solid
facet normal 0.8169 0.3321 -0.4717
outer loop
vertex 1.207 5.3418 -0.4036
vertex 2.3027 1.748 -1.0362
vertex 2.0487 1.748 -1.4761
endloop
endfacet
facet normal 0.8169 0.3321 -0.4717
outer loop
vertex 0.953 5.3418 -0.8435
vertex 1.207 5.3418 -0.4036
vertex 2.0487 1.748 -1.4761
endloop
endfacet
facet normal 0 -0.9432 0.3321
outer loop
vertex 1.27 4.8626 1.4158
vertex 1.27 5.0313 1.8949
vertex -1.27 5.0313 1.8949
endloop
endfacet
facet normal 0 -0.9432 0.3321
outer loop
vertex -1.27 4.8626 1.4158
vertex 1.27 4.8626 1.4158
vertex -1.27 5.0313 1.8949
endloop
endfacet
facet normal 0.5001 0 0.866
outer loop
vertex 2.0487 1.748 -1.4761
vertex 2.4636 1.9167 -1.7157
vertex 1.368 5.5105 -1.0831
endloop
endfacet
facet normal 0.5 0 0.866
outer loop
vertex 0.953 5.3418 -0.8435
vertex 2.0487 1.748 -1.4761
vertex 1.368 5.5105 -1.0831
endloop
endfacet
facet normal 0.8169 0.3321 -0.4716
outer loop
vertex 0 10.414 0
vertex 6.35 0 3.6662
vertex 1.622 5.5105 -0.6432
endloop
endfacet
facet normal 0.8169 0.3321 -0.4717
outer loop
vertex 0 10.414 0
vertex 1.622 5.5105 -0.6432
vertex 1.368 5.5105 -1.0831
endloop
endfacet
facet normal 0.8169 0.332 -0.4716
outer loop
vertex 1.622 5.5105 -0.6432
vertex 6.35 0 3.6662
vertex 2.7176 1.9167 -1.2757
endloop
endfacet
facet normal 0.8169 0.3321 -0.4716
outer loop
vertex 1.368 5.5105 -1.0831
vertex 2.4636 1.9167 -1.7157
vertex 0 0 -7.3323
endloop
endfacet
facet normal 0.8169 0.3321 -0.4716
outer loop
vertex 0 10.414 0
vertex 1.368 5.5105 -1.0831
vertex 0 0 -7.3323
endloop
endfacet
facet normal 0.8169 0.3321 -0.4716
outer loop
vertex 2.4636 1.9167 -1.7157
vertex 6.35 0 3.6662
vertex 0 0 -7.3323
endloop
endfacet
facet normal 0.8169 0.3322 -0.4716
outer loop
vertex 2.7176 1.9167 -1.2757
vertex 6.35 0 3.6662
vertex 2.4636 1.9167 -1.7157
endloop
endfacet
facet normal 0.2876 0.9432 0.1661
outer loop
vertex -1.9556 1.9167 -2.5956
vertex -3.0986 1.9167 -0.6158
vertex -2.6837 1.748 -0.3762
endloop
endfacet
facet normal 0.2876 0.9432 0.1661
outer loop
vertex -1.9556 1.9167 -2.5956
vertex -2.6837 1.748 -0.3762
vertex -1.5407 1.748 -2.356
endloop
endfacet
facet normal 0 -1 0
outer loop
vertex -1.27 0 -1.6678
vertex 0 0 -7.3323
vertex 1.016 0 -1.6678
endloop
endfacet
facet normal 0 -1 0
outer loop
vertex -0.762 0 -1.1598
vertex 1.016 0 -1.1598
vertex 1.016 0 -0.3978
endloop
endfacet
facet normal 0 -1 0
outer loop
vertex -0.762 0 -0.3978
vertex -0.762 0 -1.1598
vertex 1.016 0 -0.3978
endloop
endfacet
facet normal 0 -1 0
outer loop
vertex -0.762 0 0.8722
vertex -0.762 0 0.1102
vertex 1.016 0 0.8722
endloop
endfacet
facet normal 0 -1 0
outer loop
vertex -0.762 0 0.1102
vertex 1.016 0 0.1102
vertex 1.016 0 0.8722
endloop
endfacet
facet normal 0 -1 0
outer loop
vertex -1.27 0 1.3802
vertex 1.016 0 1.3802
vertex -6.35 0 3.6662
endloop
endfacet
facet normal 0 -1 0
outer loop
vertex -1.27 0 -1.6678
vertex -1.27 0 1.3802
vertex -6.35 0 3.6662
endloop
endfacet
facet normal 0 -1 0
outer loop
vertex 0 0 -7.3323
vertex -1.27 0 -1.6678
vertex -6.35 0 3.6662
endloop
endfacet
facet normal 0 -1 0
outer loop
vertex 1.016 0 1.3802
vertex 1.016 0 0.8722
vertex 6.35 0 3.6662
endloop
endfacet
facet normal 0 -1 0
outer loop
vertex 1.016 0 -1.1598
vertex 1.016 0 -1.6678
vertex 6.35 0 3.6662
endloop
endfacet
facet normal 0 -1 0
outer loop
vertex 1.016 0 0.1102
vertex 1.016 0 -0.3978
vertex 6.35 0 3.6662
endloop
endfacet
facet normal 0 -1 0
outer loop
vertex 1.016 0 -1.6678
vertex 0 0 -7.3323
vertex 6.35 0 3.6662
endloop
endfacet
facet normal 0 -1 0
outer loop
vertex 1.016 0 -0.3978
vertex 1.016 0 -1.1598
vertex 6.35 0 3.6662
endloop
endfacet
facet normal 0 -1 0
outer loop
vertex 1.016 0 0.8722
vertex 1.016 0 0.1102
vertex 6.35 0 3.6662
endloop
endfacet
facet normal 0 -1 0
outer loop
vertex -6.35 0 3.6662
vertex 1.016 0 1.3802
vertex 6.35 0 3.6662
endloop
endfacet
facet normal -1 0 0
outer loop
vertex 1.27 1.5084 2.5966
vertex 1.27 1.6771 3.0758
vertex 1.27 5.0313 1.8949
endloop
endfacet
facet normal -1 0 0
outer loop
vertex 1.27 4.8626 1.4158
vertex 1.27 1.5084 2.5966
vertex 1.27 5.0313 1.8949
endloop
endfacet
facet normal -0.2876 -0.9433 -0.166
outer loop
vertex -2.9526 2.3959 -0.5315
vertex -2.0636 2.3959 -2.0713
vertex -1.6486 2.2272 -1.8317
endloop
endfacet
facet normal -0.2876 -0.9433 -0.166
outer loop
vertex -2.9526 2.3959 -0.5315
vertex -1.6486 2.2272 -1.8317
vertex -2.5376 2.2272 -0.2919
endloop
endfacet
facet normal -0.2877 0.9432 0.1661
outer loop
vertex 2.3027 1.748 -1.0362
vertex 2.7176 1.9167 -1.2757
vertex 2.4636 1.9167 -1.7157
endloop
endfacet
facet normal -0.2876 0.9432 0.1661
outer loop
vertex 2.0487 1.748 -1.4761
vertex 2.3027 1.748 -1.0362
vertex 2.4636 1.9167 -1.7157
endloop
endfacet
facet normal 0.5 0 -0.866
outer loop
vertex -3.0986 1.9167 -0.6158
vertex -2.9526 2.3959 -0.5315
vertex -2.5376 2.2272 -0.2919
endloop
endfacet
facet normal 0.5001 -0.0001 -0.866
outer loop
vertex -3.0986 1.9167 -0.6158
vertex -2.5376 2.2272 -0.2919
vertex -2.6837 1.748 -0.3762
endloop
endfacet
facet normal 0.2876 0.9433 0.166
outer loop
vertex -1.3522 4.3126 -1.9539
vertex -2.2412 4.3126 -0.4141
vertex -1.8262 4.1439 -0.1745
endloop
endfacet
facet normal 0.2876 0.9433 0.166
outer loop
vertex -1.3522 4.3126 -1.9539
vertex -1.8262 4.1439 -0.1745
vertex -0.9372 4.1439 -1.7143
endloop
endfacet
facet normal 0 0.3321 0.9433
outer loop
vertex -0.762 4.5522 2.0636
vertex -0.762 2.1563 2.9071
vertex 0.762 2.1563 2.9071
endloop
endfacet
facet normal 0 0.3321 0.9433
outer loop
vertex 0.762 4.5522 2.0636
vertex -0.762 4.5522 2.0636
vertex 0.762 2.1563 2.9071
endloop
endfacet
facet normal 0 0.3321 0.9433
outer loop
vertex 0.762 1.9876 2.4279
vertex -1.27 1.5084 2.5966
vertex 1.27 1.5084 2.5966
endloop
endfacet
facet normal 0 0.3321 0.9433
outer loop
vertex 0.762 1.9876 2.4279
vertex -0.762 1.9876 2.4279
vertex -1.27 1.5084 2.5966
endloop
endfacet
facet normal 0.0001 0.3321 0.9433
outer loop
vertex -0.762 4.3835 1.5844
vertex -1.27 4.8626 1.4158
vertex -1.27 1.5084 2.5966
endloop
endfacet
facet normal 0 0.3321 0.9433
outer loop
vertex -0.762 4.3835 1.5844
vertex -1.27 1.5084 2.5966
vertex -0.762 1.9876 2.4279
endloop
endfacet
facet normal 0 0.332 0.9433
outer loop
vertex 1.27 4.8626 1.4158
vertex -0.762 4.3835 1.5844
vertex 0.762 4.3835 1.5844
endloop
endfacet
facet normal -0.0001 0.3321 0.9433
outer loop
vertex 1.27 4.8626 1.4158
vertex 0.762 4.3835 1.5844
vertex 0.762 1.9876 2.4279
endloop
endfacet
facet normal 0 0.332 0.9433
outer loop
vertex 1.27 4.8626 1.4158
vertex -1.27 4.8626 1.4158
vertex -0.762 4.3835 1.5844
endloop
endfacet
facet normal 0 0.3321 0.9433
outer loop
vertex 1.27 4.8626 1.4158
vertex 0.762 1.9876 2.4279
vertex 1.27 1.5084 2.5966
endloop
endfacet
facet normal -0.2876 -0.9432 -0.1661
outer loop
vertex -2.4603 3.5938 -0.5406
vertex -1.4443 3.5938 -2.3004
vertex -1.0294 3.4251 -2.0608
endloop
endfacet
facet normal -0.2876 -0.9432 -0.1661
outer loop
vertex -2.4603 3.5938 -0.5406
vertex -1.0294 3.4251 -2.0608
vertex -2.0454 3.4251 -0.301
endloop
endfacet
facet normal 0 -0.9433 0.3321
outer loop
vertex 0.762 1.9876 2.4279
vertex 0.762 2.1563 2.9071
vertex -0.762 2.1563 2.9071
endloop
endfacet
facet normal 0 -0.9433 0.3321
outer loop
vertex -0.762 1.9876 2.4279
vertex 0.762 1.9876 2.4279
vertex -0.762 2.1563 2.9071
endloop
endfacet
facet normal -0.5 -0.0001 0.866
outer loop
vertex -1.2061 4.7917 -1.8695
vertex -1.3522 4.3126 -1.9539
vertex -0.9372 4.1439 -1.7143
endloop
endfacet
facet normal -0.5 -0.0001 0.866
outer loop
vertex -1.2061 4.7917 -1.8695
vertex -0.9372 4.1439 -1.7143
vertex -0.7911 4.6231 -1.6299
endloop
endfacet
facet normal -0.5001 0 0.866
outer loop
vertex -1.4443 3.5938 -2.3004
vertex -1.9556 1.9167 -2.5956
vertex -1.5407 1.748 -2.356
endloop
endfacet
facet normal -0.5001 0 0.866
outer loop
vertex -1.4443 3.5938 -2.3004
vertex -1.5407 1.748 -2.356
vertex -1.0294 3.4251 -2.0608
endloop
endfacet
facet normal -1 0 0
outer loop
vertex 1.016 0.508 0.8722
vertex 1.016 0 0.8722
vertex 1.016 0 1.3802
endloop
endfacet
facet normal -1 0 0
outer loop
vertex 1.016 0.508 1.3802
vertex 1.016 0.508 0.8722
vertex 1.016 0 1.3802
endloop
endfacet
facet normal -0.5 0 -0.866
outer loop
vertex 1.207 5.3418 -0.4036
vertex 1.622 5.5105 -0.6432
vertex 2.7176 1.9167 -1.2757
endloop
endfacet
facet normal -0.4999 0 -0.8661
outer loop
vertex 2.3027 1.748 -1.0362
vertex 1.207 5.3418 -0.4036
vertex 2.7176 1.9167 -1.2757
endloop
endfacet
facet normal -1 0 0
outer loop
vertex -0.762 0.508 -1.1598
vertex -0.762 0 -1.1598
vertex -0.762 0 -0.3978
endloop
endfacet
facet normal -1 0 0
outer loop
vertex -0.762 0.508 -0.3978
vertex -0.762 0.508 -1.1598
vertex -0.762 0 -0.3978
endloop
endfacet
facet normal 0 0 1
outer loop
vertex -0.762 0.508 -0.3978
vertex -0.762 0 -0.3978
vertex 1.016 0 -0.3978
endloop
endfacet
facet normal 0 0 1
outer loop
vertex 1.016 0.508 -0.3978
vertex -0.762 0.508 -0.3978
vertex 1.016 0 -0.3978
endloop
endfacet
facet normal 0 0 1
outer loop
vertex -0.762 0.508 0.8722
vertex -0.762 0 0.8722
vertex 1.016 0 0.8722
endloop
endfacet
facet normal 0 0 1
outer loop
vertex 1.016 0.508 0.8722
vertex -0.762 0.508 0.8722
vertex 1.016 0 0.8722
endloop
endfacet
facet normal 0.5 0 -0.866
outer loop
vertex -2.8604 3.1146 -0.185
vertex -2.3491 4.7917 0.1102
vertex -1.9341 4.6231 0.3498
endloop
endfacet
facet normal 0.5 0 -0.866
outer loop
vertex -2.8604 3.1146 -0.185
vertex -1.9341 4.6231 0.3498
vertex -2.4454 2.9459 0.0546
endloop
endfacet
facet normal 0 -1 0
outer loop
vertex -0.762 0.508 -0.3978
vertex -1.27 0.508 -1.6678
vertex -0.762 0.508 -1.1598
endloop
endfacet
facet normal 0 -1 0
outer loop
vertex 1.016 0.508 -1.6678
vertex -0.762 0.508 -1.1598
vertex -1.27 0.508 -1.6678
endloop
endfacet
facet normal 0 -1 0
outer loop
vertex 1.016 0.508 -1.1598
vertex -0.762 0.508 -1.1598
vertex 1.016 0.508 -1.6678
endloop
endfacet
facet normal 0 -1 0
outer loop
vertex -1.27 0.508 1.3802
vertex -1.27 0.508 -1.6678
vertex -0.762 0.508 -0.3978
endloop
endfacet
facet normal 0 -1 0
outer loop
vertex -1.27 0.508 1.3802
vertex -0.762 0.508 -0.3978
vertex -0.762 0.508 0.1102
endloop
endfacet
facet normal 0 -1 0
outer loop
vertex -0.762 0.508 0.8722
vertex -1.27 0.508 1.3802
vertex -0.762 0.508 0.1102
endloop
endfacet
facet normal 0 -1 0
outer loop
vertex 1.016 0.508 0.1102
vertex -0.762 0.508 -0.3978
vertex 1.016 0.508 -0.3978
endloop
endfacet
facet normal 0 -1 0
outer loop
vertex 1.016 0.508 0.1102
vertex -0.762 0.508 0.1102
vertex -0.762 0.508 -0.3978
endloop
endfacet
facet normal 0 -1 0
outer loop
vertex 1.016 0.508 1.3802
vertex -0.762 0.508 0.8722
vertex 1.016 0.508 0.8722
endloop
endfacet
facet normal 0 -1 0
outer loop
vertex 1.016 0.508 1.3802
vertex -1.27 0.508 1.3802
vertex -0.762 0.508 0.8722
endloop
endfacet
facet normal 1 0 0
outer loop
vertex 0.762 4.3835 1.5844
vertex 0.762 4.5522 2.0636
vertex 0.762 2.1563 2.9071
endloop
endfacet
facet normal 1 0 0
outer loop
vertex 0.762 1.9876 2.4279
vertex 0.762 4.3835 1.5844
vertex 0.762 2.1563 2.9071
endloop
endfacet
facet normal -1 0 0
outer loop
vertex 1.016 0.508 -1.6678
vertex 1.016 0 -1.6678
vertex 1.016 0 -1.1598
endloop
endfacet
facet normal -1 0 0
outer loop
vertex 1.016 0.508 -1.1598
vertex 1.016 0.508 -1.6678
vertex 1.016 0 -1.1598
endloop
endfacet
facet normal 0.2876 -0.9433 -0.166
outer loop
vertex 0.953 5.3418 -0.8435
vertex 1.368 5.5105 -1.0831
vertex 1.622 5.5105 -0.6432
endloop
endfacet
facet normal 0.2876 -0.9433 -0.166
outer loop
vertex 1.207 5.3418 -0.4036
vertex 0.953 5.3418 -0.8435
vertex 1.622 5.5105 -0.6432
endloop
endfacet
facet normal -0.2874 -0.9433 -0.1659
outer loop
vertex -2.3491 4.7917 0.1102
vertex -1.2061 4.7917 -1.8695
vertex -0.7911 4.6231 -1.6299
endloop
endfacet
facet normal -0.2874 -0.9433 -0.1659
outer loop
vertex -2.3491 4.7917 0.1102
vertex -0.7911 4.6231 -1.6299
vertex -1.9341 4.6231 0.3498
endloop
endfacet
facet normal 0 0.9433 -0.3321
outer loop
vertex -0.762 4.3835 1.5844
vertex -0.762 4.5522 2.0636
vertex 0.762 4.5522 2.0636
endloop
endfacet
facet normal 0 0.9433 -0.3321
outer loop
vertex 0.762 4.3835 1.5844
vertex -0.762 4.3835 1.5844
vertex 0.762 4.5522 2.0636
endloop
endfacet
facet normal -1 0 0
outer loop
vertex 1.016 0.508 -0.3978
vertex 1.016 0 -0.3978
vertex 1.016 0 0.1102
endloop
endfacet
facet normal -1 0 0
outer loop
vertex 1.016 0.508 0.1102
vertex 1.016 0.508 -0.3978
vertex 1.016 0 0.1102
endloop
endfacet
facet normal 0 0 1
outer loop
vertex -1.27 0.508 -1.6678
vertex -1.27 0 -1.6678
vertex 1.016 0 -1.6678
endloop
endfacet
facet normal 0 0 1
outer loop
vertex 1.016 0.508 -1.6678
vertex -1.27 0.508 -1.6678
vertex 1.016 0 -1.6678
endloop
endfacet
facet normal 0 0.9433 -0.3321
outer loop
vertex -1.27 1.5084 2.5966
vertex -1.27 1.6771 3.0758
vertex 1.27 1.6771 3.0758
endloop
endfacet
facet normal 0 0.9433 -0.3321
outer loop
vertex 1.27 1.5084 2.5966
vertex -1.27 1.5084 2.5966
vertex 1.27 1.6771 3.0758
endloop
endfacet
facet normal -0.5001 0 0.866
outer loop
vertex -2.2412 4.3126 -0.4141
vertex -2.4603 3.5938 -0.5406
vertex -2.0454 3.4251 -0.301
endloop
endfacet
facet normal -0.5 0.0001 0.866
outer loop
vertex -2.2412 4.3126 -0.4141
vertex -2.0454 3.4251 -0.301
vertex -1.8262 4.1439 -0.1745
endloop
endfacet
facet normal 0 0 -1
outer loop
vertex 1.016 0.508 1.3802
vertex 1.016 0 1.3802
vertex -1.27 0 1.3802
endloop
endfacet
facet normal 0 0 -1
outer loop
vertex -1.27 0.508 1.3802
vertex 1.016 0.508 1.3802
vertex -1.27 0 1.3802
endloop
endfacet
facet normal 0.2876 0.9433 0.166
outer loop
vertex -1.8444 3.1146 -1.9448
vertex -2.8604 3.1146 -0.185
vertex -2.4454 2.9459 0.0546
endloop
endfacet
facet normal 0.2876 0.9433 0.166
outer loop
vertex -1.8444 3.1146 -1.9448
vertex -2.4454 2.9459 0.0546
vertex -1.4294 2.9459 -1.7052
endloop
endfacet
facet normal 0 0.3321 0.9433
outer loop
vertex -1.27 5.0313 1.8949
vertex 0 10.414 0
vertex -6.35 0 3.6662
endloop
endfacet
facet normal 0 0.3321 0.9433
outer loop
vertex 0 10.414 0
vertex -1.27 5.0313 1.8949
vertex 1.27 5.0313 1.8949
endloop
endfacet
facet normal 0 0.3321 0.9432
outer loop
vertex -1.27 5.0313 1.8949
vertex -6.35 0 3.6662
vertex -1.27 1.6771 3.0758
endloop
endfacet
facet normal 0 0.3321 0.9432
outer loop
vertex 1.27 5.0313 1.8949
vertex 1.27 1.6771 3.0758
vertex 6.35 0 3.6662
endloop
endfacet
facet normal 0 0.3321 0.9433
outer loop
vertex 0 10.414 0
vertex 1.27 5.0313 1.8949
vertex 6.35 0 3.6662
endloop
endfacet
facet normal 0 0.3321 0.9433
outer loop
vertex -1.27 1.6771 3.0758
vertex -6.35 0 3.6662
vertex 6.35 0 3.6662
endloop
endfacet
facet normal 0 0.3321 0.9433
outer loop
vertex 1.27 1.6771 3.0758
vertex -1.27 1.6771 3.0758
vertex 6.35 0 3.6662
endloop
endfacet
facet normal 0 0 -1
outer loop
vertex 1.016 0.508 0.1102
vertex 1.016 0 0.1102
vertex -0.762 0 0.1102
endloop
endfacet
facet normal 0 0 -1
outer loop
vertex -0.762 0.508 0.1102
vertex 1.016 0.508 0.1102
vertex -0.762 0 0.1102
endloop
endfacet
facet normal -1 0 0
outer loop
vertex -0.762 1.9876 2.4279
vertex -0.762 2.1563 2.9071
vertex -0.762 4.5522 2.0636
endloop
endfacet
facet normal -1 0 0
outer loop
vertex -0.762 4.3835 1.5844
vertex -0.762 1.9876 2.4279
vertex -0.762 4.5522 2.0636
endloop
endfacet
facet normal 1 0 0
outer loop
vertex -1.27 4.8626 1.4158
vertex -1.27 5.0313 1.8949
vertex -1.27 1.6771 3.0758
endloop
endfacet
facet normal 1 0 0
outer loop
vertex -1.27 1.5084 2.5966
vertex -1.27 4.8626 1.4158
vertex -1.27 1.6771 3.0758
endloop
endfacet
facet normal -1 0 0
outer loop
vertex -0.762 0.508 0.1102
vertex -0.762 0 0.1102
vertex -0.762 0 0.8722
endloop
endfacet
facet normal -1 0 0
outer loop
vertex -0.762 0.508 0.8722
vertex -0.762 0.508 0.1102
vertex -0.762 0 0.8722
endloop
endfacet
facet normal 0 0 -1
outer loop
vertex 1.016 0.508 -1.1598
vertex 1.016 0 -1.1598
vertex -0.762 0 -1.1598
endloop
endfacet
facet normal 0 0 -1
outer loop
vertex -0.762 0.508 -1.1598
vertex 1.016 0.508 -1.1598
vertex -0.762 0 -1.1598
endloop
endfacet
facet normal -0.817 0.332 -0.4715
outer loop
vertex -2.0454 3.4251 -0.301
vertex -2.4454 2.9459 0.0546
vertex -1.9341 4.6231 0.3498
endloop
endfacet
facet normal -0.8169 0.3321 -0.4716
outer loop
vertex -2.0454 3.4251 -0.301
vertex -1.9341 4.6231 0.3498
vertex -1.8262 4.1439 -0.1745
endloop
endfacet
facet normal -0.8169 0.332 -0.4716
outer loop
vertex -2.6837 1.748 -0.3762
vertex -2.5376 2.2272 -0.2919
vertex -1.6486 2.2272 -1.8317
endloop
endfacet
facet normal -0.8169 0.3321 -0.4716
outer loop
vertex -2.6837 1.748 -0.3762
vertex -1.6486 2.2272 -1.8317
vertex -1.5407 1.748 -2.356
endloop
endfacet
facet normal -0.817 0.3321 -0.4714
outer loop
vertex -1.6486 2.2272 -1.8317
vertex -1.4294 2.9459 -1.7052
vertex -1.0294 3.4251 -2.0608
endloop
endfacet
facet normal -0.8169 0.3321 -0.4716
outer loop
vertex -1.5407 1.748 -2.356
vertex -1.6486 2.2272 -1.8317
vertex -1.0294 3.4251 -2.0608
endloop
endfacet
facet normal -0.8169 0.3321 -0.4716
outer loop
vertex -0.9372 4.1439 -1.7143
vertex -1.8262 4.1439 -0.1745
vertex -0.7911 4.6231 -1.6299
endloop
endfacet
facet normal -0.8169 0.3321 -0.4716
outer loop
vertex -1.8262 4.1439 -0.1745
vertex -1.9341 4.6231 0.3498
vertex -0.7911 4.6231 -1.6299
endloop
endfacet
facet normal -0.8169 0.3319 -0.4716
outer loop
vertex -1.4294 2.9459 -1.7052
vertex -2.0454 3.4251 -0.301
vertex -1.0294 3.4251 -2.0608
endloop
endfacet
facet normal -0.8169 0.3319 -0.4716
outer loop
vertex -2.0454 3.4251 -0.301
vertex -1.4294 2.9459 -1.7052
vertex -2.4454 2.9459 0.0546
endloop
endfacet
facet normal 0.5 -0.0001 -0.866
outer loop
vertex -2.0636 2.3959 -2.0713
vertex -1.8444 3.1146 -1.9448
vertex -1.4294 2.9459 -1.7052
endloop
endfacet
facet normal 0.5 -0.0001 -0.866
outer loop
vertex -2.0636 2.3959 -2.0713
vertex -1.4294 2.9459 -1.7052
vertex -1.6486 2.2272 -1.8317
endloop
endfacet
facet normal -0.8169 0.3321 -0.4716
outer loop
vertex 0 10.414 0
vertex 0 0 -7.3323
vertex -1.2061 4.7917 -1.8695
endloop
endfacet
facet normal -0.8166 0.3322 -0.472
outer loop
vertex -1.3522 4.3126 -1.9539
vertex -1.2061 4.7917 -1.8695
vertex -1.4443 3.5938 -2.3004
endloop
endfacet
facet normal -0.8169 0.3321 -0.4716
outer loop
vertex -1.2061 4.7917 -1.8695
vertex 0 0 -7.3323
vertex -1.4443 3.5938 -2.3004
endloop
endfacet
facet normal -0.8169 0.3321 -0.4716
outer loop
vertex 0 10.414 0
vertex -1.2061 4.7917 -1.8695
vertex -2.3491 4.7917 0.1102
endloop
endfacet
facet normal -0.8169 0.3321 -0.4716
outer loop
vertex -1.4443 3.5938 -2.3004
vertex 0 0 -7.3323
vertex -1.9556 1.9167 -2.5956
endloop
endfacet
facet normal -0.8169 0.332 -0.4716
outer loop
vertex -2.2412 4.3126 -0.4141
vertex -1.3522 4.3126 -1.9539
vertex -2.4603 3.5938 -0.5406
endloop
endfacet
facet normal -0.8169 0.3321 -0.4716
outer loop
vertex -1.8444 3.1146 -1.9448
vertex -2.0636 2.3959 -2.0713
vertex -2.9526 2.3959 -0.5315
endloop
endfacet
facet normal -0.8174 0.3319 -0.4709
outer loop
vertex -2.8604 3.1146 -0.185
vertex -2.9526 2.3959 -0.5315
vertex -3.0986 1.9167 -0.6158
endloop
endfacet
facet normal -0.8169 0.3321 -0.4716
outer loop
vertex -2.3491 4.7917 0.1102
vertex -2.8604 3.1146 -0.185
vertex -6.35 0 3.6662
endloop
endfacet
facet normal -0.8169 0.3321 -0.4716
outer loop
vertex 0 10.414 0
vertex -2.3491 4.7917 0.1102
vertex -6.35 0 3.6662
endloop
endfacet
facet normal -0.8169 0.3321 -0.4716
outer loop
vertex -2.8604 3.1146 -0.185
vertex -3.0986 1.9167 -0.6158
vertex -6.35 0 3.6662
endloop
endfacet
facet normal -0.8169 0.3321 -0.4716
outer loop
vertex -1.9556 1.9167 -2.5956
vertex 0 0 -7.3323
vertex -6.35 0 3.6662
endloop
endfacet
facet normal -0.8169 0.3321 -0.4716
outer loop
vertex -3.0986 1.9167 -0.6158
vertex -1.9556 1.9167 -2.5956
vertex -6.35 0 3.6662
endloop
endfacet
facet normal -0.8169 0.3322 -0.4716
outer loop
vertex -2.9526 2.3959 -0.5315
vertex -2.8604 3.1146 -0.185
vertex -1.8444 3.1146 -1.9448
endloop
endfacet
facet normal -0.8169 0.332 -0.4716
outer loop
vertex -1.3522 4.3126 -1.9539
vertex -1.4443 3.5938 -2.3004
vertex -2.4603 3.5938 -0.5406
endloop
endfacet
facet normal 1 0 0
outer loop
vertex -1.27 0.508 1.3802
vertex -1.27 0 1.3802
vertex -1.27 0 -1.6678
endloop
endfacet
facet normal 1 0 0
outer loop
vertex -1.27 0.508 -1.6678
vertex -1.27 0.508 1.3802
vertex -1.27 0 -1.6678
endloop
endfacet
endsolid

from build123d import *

# Parameters (mm, degrees)
SKETCH4_W               = 2.54
SKETCH4_H               = 3.556
SKETCH4_W_2             = 1.524
SKETCH4_H_2             = 2.54
CUT_EXTRUDE1_DEPTH      = 0.508
CUT_EXTRUDE2_DEPTH      = 0.508
CUT_EXTRUDE3_DEPTH      = 0.508
CUT_EXTRUDE4_DEPTH      = 15.231557685
CUT_EXTRUDE4_DEPTH_BACK = 0.508
SKETCH8_W               = 0.762
SKETCH8_H               = 0.254
SKETCH8_W_2             = 1.016
SKETCH8_W_3             = 0.254


with BuildPart() as part:
    # Sketch1 → Loft1 section 0
    with BuildSketch(Plane(origin=(0, 0, 0), x_dir=(1, 0, 0), z_dir=(0, 1, 0)), mode=Mode.PRIVATE) as loft1_s0:
        with BuildLine():
            Line((0, 7.332348419), (-6.35, -3.666174209))
            Line((-6.35, -3.666174209), (6.35, -3.666174209))
            Line((6.35, -3.666174209), (0, 7.332348419))
        make_face()
    loft([Vertex(0, 10.414, 0), loft1_s0.sketch])

    # Sketch4 → Cut-Extrude1 (cut)
    with BuildSketch(Plane(origin=(0, 1.148332745, 3.26191188), x_dir=(1, 0, 0), z_dir=(6.377659034928701e-15, 0.3320665177261577, 0.9432559715184545))):
        with Locations((0, 2.338586297)):
            Rectangle(SKETCH4_W, SKETCH4_H)
        with Locations((0, 2.338586297)):
            Rectangle(SKETCH4_W_2, SKETCH4_H_2, mode=Mode.SUBTRACT)
    extrude(amount=-CUT_EXTRUDE1_DEPTH, mode=Mode.SUBTRACT)

    # Sketch6 → Cut-Extrude2 (cut)
    with BuildSketch(Plane(origin=(2.824898553, 1.148332745, -1.63095594), x_dir=(-0.43690884833145366, -0.17760522289896655, -0.881797620233062), z_dir=(0.8168836336063493, 0.3320665177261613, -0.4716279857592303))):
        Polygon((-0.621304332, 4.589694472), (-1.120218022, 4.494043391), (-0.402834916, 0.752190711), (0.096078775, 0.847841792), align=None)
    extrude(amount=-CUT_EXTRUDE2_DEPTH, mode=Mode.SUBTRACT)

    # Sketch7 → Cut-Extrude3 (cut)
    with BuildSketch(Plane(origin=(-2.824898553, 1.148332745, -1.63095594), x_dir=(-0.43690884833145016, 0.17760522289896233, 0.8817976202330645), z_dir=(-0.8168836336063534, 0.33206651772615786, -0.47162798575922543))):
        Polygon((1.974568782, 3.554370693), (-0.270542826, 3.984800557), (-0.366193906, 3.485886867), (1.380004011, 3.151108083), (1.23652739, 2.402737547), (-0.759127373, 2.785341871), (-1.093906156, 1.039143954), (1.151205452, 0.60871409), (1.246856533, 1.10762778), (-0.499341385, 1.442406563), (-0.355864763, 2.190777099), (1.639789999, 1.808172776), align=None)
    extrude(amount=-CUT_EXTRUDE3_DEPTH, mode=Mode.SUBTRACT)

    # Sketch8 → Cut-Extrude4 (cut, two sides: drawn at the far end of the back side and taken through both)
    with BuildSketch(Plane.XZ.offset(-CUT_EXTRUDE4_DEPTH_BACK)):
        Polygon((0, 1.126174209), (-1.016, 1.126174209), (-1.016, 0.110174209), (-0.762, 0.110174209), (-0.762, 0.872174209), (0, 0.872174209), align=None)
        Polygon((-1.016, 0.110174209), (-1.016, 1.126174209), (0, 1.126174209), (0, 1.380174209), (-1.27, 1.380174209), (-1.27, -1.667825791), (0, -1.667825791), (0, -1.413825791), (-1.016, -1.413825791), (-1.016, -0.397825791), (-1.016, -0.143825791), align=None)
        with Locations((-0.381, -0.016825791)):
            Rectangle(SKETCH8_W, SKETCH8_H)
        with Locations((-0.381, -0.270825791)):
            Rectangle(SKETCH8_W, SKETCH8_H)
        with Locations((0.508, -0.016825791)):
            Rectangle(SKETCH8_W_2, SKETCH8_H)
        with Locations((0.508, -0.270825791)):
            Rectangle(SKETCH8_W_2, SKETCH8_H)
        with Locations((-0.889, -0.016825791)):
            Rectangle(SKETCH8_W_3, SKETCH8_H)
        with Locations((-0.889, -0.270825791)):
            Rectangle(SKETCH8_W_3, SKETCH8_H)
        Polygon((-0.762, -0.397825791), (-1.016, -0.397825791), (-1.016, -1.413825791), (0, -1.413825791), (0, -1.159825791), (-0.762, -1.159825791), align=None)
        with Locations((0.508, -1.286825791)):
            Rectangle(SKETCH8_W_2, SKETCH8_H)
        with Locations((0.508, -1.540825791)):
            Rectangle(SKETCH8_W_2, SKETCH8_H)
        with Locations((0.508, 0.999174209)):
            Rectangle(SKETCH8_W_2, SKETCH8_H)
        with Locations((0.508, 1.253174209)):
            Rectangle(SKETCH8_W_2, SKETCH8_H)
    extrude(amount=CUT_EXTRUDE4_DEPTH + CUT_EXTRUDE4_DEPTH_BACK, mode=Mode.SUBTRACT)


solid = part.part
